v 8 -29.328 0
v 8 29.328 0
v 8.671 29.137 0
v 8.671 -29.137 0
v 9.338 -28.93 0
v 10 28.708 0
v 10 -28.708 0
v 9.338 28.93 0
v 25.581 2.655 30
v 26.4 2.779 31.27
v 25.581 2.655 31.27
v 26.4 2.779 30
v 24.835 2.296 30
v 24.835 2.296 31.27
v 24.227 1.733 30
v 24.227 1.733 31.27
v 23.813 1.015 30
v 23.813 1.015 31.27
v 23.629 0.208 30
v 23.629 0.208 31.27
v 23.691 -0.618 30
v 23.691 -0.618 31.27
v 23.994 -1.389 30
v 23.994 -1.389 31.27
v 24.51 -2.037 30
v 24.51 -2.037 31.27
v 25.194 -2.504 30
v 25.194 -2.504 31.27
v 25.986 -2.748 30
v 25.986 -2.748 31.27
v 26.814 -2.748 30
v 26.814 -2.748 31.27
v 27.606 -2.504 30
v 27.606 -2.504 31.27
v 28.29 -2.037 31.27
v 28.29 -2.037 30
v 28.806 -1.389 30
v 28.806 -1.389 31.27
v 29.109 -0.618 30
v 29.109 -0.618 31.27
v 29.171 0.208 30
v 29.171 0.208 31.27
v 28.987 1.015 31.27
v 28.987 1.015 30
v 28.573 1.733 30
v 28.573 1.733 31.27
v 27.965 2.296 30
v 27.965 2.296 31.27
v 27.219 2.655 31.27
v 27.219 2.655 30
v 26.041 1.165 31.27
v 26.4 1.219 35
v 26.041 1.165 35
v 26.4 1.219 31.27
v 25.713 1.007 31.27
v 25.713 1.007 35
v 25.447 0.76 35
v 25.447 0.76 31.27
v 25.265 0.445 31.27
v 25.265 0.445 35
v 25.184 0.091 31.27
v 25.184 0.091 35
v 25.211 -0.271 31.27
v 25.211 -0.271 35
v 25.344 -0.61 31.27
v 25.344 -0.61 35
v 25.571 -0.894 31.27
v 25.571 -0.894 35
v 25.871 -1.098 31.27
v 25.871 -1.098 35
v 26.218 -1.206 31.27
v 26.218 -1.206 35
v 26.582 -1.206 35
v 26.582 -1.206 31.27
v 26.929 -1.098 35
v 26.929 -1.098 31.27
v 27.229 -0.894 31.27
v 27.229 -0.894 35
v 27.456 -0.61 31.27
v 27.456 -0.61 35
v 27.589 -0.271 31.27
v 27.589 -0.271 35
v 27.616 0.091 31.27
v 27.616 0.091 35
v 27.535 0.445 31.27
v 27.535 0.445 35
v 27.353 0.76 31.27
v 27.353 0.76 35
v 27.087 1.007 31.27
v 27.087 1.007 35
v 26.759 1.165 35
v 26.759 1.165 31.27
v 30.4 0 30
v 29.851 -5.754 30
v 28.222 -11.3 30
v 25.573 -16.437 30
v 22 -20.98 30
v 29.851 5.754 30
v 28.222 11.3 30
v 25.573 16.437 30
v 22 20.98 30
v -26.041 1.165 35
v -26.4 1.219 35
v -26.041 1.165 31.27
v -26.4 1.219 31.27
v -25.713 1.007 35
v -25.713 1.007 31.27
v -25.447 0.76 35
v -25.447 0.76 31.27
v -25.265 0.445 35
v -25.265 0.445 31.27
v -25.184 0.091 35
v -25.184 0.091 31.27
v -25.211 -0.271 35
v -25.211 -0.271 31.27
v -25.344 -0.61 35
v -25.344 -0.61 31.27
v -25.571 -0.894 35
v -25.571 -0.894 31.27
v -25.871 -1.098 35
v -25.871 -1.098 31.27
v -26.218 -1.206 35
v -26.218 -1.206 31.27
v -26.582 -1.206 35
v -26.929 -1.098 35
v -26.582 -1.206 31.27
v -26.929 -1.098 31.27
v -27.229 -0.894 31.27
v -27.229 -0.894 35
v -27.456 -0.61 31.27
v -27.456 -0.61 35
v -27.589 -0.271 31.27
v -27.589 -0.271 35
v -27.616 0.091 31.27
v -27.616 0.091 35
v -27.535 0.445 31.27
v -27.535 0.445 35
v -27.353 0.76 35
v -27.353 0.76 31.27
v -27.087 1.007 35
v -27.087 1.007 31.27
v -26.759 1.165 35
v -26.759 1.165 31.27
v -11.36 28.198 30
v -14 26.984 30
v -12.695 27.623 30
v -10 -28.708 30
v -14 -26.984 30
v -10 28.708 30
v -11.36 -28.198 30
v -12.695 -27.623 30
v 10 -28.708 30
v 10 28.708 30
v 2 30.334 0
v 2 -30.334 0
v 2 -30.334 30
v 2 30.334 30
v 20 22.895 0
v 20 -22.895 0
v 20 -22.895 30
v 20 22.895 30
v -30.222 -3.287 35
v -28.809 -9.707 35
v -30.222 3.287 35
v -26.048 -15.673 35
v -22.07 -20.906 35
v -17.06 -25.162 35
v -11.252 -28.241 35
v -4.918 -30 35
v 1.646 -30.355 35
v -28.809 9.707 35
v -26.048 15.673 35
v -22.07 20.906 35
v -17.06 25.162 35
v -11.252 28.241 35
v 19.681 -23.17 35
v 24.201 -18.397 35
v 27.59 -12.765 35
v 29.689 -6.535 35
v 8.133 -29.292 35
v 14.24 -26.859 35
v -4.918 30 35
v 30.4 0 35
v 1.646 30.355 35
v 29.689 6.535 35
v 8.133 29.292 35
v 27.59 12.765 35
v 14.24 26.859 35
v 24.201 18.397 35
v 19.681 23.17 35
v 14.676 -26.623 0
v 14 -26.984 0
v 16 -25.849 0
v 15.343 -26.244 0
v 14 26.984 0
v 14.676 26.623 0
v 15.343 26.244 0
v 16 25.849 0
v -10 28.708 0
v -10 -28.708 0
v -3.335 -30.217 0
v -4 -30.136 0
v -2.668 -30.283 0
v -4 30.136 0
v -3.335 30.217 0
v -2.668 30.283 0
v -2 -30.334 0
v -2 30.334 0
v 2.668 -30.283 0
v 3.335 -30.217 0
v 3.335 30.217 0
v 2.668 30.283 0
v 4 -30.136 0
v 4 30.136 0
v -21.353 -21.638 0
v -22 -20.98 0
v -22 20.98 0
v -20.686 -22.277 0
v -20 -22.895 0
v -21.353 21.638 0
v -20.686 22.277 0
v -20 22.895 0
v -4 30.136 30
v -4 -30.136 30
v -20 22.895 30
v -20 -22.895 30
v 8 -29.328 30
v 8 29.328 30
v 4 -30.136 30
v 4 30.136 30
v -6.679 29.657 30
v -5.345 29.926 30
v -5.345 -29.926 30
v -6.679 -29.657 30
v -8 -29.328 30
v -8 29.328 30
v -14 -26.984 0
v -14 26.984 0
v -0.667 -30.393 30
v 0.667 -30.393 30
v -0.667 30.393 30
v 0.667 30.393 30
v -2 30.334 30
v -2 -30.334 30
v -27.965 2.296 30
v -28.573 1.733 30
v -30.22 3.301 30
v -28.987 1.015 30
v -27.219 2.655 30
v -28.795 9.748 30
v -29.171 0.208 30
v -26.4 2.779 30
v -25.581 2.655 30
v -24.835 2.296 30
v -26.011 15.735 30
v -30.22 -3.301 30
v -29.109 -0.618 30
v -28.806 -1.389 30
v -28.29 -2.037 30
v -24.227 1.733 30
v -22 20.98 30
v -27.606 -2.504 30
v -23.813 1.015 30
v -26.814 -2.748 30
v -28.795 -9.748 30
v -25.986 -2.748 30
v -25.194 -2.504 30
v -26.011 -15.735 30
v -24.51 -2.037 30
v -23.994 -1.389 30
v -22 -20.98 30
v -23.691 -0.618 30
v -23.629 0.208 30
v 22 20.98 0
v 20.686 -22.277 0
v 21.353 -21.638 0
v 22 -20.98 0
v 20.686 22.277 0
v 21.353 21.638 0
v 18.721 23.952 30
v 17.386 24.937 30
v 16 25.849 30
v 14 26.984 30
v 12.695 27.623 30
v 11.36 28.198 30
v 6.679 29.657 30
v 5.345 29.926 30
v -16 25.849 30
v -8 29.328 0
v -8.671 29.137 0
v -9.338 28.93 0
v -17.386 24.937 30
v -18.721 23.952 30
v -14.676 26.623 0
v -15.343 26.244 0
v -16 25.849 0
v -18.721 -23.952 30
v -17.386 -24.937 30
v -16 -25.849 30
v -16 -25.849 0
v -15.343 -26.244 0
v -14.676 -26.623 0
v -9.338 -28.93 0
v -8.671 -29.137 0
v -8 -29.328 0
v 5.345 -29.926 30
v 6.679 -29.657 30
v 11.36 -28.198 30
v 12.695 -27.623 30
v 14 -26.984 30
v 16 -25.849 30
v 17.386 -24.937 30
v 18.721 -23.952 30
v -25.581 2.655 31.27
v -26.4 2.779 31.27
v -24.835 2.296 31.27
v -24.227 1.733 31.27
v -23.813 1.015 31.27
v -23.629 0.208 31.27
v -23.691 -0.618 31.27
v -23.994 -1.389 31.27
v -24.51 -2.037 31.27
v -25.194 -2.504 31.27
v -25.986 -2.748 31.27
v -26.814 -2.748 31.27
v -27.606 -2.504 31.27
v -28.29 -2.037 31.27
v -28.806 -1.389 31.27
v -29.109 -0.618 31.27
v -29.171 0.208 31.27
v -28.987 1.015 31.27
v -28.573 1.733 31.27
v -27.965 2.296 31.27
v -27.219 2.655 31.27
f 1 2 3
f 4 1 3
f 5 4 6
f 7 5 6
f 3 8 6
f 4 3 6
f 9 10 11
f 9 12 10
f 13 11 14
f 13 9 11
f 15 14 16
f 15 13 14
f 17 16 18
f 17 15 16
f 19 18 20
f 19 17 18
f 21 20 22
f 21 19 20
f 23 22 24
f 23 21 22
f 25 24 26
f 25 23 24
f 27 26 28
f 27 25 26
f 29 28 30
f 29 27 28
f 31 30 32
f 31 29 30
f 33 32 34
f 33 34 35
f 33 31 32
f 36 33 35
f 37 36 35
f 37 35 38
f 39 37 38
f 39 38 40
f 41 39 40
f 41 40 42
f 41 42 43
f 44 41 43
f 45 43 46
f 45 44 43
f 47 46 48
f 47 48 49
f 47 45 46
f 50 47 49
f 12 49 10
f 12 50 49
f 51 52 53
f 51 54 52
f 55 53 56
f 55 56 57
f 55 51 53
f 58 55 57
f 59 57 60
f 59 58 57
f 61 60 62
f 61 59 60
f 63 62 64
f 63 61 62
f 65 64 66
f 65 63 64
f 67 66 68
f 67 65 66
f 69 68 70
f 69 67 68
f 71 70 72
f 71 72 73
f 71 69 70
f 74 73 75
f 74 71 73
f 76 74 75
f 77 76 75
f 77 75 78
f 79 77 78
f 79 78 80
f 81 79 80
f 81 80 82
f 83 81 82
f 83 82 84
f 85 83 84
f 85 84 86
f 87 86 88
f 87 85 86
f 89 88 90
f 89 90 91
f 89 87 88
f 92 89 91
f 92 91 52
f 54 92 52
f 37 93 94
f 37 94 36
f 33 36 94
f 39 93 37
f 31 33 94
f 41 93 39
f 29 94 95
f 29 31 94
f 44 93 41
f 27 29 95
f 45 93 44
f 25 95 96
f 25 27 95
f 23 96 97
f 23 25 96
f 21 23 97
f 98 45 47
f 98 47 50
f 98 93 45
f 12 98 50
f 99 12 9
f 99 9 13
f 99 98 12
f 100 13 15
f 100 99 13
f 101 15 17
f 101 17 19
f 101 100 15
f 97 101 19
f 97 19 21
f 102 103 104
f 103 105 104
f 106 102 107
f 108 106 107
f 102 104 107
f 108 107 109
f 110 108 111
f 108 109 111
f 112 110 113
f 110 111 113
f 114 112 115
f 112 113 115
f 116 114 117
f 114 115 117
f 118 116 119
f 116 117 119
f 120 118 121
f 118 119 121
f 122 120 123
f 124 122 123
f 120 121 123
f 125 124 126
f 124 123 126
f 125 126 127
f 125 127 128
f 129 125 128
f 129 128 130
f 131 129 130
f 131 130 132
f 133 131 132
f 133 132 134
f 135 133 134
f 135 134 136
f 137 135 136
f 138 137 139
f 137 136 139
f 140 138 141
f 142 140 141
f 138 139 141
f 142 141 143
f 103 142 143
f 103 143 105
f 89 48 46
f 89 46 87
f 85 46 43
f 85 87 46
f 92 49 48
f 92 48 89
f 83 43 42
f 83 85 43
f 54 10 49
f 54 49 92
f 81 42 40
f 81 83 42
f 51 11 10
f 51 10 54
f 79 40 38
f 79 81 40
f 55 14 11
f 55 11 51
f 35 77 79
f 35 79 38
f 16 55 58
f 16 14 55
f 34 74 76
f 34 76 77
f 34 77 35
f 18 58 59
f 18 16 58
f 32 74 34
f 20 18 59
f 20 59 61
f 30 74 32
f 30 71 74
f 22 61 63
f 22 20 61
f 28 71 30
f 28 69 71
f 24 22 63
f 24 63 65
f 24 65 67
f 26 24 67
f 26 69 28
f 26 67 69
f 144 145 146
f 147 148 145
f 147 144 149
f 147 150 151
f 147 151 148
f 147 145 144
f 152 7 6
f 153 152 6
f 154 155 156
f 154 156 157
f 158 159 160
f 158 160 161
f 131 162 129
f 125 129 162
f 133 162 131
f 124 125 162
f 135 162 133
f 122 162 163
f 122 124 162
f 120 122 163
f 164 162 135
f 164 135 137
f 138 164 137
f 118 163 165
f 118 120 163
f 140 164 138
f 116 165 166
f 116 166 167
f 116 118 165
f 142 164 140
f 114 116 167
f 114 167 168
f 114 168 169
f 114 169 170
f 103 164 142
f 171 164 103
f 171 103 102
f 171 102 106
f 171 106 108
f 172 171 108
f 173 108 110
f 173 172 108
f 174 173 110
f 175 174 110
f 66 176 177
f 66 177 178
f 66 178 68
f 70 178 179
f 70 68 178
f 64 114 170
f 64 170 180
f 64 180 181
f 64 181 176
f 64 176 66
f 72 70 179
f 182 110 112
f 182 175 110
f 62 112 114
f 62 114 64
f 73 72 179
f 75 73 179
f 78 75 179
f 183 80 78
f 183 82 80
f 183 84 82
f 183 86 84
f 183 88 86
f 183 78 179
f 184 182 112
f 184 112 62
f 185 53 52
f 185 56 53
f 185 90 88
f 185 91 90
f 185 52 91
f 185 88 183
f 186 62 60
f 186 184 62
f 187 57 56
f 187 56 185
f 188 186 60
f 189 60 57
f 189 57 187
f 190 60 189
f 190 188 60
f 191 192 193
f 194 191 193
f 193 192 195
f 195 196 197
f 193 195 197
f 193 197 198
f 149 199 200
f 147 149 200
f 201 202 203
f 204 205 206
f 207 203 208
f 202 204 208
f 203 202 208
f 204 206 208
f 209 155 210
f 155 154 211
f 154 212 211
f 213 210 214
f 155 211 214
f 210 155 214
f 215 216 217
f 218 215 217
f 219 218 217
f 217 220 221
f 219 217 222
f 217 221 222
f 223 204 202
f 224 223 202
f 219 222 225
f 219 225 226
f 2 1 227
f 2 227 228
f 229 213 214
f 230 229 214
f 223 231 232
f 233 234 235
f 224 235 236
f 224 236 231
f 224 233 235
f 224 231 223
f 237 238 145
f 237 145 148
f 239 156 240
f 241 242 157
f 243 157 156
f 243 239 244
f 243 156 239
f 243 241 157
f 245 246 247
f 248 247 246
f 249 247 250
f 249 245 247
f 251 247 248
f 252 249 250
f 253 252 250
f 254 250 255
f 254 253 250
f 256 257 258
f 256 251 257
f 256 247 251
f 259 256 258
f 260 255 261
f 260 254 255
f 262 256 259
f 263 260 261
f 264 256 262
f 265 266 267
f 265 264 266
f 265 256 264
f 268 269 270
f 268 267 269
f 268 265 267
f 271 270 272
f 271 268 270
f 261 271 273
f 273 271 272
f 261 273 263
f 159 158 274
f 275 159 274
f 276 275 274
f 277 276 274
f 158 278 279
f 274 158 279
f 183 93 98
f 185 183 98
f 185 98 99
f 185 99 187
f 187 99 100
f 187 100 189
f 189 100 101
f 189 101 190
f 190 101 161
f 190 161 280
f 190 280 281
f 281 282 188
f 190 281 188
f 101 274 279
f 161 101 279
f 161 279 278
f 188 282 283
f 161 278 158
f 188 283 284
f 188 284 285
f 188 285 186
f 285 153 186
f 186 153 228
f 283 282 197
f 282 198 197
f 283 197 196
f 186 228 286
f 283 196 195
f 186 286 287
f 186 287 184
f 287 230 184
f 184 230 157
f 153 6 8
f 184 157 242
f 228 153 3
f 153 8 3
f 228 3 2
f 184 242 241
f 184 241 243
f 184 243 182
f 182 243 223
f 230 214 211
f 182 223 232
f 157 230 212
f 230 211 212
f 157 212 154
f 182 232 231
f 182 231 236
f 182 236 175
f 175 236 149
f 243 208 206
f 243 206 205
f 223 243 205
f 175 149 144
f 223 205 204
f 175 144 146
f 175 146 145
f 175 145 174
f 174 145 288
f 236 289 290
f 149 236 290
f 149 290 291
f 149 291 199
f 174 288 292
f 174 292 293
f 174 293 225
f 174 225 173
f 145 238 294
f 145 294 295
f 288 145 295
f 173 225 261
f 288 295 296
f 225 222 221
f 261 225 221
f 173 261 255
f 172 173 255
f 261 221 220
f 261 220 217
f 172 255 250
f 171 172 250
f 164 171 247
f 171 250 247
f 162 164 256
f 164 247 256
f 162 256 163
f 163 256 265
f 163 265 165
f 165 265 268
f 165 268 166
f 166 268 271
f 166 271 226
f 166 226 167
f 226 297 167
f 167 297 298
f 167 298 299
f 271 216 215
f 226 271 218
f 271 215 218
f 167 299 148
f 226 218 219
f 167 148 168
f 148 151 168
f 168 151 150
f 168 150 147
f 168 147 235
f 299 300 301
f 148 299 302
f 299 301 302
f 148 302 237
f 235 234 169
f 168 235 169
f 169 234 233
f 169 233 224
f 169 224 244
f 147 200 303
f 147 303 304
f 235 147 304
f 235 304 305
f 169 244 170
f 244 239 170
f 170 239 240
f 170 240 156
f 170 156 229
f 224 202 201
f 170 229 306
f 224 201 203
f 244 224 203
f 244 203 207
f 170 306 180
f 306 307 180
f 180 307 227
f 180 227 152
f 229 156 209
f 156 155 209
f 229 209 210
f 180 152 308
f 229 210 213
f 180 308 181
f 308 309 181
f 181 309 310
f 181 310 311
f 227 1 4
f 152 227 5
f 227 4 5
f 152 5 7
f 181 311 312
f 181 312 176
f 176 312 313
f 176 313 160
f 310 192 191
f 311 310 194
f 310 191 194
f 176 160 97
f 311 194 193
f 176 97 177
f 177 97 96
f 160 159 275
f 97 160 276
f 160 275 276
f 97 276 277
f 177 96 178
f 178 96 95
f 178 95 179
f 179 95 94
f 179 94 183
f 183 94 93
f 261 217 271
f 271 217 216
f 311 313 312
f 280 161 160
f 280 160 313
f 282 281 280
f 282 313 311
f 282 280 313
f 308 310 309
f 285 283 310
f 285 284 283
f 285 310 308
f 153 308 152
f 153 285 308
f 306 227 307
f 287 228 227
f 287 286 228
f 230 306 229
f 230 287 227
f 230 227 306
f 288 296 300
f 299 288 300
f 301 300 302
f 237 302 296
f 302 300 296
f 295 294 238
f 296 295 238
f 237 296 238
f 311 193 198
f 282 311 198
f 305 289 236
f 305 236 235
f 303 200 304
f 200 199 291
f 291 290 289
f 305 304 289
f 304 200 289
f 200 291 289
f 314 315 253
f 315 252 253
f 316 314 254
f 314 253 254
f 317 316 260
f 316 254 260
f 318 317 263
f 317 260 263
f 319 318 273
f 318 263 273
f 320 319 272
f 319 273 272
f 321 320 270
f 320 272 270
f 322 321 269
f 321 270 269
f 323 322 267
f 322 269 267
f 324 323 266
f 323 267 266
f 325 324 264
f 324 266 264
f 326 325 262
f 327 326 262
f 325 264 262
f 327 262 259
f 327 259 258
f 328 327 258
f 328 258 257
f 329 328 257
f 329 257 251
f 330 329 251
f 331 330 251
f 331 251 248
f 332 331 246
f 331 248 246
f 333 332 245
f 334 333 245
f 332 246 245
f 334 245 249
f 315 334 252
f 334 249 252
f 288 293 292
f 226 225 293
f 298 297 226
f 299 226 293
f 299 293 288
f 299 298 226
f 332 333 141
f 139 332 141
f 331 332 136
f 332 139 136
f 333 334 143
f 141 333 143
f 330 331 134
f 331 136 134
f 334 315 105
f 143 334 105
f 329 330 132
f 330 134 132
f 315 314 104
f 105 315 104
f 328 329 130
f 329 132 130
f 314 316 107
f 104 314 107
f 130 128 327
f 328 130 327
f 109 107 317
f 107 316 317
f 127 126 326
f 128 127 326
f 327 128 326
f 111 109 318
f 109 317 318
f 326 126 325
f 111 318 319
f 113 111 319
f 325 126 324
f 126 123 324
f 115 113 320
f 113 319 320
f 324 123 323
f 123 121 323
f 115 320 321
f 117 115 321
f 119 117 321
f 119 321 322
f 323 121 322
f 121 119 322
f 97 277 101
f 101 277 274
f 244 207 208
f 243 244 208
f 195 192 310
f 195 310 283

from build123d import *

# Parameters (mm, degrees)
SKETCH1_R               = 30.4
BOSS_EXTRUDE1_DEPTH     = 35
SKETCH4_W               = 4
SKETCH4_H               = 60.8
CUT_EXTRUDE1_DEPTH      = 30
LPATTERN1_COUNT         = 5
LPATTERN1_PITCH         = 6
MIRROR1_COPY_1_SKETCH_W = 4
MIRROR1_COPY_1_SKETCH_H = 60.8
MIRROR1_COPY_1_DEPTH    = 30
MIRROR1_COPY_2_SKETCH_W = 4
MIRROR1_COPY_2_SKETCH_H = 60.8
MIRROR1_COPY_2_DEPTH    = 30
MIRROR1_COPY_3_SKETCH_W = 4
MIRROR1_COPY_3_SKETCH_H = 60.8
MIRROR1_COPY_3_DEPTH    = 30
MIRROR1_COPY_4_SKETCH_W = 4
MIRROR1_COPY_4_SKETCH_H = 60.8
MIRROR1_COPY_4_DEPTH    = 30
MIRROR1_COPY_5_SKETCH_W = 4
MIRROR1_COPY_5_SKETCH_H = 60.8
MIRROR1_COPY_5_DEPTH    = 30
SKETCH9_W               = 4.4
SKETCH9_H               = 31.506189868
CUT_EXTRUDE2_DEPTH      = 30


with BuildPart() as part:
    # Sketch1 → Boss-Extrude1 (new body)
    with BuildSketch(Plane.XY):
        Circle(SKETCH1_R)
    extrude(amount=BOSS_EXTRUDE1_DEPTH)

    # Sketch4 → Cut-Extrude1 (cut)
    with BuildSketch(Plane(origin=(0, 0, 0), x_dir=(-1, 0, 0), z_dir=(0, 0, -1))):
        Rectangle(SKETCH4_W, SKETCH4_H)
    cut_extrude1 = extrude(amount=-CUT_EXTRUDE1_DEPTH, mode=Mode.SUBTRACT)

    # LPattern1: Cut-Extrude1 ×5
    with Locations(*[(i * LPATTERN1_PITCH, 0, 0) for i in range(1, LPATTERN1_COUNT)]):
        add(cut_extrude1, mode=Mode.SUBTRACT)

    # Mirror1 copy 1 sketch → Mirror1 copy 1 (cut)
    with BuildSketch(Plane(origin=(-6, 0, 0), x_dir=(1, 0, 0), z_dir=(0, 0, -1))):
        Rectangle(MIRROR1_COPY_1_SKETCH_W, MIRROR1_COPY_1_SKETCH_H)
    extrude(amount=-MIRROR1_COPY_1_DEPTH, mode=Mode.SUBTRACT)

    # Mirror1 copy 2 sketch → Mirror1 copy 2 (cut)
    with BuildSketch(Plane(origin=(-12, 0, 0), x_dir=(1, 0, 0), z_dir=(0, 0, -1))):
        Rectangle(MIRROR1_COPY_2_SKETCH_W, MIRROR1_COPY_2_SKETCH_H)
    extrude(amount=-MIRROR1_COPY_2_DEPTH, mode=Mode.SUBTRACT)

    # Mirror1 copy 3 sketch → Mirror1 copy 3 (cut)
    with BuildSketch(Plane(origin=(-18, 0, 0), x_dir=(1, 0, 0), z_dir=(0, 0, -1))):
        Rectangle(MIRROR1_COPY_3_SKETCH_W, MIRROR1_COPY_3_SKETCH_H)
    extrude(amount=-MIRROR1_COPY_3_DEPTH, mode=Mode.SUBTRACT)

    # Mirror1 copy 4 sketch → Mirror1 copy 4 (cut)
    with BuildSketch(Plane(origin=(-24, 0, 0), x_dir=(1, 0, 0), z_dir=(0, 0, -1))):
        Rectangle(MIRROR1_COPY_4_SKETCH_W, MIRROR1_COPY_4_SKETCH_H)
    extrude(amount=-MIRROR1_COPY_4_DEPTH, mode=Mode.SUBTRACT)

    # Mirror1 copy 5 sketch → Mirror1 copy 5 (cut)
    with BuildSketch(Plane(origin=(0, 0, 0), x_dir=(1, 0, 0), z_dir=(0, 0, -1))):
        Rectangle(MIRROR1_COPY_5_SKETCH_W, MIRROR1_COPY_5_SKETCH_H)
    extrude(amount=-MIRROR1_COPY_5_DEPTH, mode=Mode.SUBTRACT)

    # Sketch9 → Cut-Extrude2 (cut)
    with BuildSketch(Plane(origin=(0, 0, 0), x_dir=(-1, 0, 0), z_dir=(0, 0, -1))):
        with Locations((-28.2, 0)):
            Rectangle(SKETCH9_W, SKETCH9_H)
        with Locations((28.2, 0)):
            Rectangle(SKETCH9_W, SKETCH9_H)
    extrude(amount=-CUT_EXTRUDE2_DEPTH, mode=Mode.SUBTRACT)

    # Sketch14 → CBORE for #2 Binding Head Machine Screw2 (revolve, cut)
    with BuildSketch(Plane(origin=(26.4, 0, 30), x_dir=(0, 1, 0), z_dir=(1, 0, 0))):
        Polygon((0, 0), (0, 5.732569267), (1.2192, 5), (1.2192, 1.27), (2.77876, 1.27), (2.77876, 0), align=None)
    cbore_for_2_binding_head_machine_screw2 = revolve(axis=Axis((26.4, 0, 23.65), (0, 0, 1)), mode=Mode.SUBTRACT)

    # Mirror2: CBORE for #2 Binding Head Machine Screw2 across plane
    add(cbore_for_2_binding_head_machine_screw2.mirror(Plane(origin=(0, 0, 0), x_dir=(0, 0, 1), z_dir=(1, 0, 0))), mode=Mode.SUBTRACT)


solid = part.part
